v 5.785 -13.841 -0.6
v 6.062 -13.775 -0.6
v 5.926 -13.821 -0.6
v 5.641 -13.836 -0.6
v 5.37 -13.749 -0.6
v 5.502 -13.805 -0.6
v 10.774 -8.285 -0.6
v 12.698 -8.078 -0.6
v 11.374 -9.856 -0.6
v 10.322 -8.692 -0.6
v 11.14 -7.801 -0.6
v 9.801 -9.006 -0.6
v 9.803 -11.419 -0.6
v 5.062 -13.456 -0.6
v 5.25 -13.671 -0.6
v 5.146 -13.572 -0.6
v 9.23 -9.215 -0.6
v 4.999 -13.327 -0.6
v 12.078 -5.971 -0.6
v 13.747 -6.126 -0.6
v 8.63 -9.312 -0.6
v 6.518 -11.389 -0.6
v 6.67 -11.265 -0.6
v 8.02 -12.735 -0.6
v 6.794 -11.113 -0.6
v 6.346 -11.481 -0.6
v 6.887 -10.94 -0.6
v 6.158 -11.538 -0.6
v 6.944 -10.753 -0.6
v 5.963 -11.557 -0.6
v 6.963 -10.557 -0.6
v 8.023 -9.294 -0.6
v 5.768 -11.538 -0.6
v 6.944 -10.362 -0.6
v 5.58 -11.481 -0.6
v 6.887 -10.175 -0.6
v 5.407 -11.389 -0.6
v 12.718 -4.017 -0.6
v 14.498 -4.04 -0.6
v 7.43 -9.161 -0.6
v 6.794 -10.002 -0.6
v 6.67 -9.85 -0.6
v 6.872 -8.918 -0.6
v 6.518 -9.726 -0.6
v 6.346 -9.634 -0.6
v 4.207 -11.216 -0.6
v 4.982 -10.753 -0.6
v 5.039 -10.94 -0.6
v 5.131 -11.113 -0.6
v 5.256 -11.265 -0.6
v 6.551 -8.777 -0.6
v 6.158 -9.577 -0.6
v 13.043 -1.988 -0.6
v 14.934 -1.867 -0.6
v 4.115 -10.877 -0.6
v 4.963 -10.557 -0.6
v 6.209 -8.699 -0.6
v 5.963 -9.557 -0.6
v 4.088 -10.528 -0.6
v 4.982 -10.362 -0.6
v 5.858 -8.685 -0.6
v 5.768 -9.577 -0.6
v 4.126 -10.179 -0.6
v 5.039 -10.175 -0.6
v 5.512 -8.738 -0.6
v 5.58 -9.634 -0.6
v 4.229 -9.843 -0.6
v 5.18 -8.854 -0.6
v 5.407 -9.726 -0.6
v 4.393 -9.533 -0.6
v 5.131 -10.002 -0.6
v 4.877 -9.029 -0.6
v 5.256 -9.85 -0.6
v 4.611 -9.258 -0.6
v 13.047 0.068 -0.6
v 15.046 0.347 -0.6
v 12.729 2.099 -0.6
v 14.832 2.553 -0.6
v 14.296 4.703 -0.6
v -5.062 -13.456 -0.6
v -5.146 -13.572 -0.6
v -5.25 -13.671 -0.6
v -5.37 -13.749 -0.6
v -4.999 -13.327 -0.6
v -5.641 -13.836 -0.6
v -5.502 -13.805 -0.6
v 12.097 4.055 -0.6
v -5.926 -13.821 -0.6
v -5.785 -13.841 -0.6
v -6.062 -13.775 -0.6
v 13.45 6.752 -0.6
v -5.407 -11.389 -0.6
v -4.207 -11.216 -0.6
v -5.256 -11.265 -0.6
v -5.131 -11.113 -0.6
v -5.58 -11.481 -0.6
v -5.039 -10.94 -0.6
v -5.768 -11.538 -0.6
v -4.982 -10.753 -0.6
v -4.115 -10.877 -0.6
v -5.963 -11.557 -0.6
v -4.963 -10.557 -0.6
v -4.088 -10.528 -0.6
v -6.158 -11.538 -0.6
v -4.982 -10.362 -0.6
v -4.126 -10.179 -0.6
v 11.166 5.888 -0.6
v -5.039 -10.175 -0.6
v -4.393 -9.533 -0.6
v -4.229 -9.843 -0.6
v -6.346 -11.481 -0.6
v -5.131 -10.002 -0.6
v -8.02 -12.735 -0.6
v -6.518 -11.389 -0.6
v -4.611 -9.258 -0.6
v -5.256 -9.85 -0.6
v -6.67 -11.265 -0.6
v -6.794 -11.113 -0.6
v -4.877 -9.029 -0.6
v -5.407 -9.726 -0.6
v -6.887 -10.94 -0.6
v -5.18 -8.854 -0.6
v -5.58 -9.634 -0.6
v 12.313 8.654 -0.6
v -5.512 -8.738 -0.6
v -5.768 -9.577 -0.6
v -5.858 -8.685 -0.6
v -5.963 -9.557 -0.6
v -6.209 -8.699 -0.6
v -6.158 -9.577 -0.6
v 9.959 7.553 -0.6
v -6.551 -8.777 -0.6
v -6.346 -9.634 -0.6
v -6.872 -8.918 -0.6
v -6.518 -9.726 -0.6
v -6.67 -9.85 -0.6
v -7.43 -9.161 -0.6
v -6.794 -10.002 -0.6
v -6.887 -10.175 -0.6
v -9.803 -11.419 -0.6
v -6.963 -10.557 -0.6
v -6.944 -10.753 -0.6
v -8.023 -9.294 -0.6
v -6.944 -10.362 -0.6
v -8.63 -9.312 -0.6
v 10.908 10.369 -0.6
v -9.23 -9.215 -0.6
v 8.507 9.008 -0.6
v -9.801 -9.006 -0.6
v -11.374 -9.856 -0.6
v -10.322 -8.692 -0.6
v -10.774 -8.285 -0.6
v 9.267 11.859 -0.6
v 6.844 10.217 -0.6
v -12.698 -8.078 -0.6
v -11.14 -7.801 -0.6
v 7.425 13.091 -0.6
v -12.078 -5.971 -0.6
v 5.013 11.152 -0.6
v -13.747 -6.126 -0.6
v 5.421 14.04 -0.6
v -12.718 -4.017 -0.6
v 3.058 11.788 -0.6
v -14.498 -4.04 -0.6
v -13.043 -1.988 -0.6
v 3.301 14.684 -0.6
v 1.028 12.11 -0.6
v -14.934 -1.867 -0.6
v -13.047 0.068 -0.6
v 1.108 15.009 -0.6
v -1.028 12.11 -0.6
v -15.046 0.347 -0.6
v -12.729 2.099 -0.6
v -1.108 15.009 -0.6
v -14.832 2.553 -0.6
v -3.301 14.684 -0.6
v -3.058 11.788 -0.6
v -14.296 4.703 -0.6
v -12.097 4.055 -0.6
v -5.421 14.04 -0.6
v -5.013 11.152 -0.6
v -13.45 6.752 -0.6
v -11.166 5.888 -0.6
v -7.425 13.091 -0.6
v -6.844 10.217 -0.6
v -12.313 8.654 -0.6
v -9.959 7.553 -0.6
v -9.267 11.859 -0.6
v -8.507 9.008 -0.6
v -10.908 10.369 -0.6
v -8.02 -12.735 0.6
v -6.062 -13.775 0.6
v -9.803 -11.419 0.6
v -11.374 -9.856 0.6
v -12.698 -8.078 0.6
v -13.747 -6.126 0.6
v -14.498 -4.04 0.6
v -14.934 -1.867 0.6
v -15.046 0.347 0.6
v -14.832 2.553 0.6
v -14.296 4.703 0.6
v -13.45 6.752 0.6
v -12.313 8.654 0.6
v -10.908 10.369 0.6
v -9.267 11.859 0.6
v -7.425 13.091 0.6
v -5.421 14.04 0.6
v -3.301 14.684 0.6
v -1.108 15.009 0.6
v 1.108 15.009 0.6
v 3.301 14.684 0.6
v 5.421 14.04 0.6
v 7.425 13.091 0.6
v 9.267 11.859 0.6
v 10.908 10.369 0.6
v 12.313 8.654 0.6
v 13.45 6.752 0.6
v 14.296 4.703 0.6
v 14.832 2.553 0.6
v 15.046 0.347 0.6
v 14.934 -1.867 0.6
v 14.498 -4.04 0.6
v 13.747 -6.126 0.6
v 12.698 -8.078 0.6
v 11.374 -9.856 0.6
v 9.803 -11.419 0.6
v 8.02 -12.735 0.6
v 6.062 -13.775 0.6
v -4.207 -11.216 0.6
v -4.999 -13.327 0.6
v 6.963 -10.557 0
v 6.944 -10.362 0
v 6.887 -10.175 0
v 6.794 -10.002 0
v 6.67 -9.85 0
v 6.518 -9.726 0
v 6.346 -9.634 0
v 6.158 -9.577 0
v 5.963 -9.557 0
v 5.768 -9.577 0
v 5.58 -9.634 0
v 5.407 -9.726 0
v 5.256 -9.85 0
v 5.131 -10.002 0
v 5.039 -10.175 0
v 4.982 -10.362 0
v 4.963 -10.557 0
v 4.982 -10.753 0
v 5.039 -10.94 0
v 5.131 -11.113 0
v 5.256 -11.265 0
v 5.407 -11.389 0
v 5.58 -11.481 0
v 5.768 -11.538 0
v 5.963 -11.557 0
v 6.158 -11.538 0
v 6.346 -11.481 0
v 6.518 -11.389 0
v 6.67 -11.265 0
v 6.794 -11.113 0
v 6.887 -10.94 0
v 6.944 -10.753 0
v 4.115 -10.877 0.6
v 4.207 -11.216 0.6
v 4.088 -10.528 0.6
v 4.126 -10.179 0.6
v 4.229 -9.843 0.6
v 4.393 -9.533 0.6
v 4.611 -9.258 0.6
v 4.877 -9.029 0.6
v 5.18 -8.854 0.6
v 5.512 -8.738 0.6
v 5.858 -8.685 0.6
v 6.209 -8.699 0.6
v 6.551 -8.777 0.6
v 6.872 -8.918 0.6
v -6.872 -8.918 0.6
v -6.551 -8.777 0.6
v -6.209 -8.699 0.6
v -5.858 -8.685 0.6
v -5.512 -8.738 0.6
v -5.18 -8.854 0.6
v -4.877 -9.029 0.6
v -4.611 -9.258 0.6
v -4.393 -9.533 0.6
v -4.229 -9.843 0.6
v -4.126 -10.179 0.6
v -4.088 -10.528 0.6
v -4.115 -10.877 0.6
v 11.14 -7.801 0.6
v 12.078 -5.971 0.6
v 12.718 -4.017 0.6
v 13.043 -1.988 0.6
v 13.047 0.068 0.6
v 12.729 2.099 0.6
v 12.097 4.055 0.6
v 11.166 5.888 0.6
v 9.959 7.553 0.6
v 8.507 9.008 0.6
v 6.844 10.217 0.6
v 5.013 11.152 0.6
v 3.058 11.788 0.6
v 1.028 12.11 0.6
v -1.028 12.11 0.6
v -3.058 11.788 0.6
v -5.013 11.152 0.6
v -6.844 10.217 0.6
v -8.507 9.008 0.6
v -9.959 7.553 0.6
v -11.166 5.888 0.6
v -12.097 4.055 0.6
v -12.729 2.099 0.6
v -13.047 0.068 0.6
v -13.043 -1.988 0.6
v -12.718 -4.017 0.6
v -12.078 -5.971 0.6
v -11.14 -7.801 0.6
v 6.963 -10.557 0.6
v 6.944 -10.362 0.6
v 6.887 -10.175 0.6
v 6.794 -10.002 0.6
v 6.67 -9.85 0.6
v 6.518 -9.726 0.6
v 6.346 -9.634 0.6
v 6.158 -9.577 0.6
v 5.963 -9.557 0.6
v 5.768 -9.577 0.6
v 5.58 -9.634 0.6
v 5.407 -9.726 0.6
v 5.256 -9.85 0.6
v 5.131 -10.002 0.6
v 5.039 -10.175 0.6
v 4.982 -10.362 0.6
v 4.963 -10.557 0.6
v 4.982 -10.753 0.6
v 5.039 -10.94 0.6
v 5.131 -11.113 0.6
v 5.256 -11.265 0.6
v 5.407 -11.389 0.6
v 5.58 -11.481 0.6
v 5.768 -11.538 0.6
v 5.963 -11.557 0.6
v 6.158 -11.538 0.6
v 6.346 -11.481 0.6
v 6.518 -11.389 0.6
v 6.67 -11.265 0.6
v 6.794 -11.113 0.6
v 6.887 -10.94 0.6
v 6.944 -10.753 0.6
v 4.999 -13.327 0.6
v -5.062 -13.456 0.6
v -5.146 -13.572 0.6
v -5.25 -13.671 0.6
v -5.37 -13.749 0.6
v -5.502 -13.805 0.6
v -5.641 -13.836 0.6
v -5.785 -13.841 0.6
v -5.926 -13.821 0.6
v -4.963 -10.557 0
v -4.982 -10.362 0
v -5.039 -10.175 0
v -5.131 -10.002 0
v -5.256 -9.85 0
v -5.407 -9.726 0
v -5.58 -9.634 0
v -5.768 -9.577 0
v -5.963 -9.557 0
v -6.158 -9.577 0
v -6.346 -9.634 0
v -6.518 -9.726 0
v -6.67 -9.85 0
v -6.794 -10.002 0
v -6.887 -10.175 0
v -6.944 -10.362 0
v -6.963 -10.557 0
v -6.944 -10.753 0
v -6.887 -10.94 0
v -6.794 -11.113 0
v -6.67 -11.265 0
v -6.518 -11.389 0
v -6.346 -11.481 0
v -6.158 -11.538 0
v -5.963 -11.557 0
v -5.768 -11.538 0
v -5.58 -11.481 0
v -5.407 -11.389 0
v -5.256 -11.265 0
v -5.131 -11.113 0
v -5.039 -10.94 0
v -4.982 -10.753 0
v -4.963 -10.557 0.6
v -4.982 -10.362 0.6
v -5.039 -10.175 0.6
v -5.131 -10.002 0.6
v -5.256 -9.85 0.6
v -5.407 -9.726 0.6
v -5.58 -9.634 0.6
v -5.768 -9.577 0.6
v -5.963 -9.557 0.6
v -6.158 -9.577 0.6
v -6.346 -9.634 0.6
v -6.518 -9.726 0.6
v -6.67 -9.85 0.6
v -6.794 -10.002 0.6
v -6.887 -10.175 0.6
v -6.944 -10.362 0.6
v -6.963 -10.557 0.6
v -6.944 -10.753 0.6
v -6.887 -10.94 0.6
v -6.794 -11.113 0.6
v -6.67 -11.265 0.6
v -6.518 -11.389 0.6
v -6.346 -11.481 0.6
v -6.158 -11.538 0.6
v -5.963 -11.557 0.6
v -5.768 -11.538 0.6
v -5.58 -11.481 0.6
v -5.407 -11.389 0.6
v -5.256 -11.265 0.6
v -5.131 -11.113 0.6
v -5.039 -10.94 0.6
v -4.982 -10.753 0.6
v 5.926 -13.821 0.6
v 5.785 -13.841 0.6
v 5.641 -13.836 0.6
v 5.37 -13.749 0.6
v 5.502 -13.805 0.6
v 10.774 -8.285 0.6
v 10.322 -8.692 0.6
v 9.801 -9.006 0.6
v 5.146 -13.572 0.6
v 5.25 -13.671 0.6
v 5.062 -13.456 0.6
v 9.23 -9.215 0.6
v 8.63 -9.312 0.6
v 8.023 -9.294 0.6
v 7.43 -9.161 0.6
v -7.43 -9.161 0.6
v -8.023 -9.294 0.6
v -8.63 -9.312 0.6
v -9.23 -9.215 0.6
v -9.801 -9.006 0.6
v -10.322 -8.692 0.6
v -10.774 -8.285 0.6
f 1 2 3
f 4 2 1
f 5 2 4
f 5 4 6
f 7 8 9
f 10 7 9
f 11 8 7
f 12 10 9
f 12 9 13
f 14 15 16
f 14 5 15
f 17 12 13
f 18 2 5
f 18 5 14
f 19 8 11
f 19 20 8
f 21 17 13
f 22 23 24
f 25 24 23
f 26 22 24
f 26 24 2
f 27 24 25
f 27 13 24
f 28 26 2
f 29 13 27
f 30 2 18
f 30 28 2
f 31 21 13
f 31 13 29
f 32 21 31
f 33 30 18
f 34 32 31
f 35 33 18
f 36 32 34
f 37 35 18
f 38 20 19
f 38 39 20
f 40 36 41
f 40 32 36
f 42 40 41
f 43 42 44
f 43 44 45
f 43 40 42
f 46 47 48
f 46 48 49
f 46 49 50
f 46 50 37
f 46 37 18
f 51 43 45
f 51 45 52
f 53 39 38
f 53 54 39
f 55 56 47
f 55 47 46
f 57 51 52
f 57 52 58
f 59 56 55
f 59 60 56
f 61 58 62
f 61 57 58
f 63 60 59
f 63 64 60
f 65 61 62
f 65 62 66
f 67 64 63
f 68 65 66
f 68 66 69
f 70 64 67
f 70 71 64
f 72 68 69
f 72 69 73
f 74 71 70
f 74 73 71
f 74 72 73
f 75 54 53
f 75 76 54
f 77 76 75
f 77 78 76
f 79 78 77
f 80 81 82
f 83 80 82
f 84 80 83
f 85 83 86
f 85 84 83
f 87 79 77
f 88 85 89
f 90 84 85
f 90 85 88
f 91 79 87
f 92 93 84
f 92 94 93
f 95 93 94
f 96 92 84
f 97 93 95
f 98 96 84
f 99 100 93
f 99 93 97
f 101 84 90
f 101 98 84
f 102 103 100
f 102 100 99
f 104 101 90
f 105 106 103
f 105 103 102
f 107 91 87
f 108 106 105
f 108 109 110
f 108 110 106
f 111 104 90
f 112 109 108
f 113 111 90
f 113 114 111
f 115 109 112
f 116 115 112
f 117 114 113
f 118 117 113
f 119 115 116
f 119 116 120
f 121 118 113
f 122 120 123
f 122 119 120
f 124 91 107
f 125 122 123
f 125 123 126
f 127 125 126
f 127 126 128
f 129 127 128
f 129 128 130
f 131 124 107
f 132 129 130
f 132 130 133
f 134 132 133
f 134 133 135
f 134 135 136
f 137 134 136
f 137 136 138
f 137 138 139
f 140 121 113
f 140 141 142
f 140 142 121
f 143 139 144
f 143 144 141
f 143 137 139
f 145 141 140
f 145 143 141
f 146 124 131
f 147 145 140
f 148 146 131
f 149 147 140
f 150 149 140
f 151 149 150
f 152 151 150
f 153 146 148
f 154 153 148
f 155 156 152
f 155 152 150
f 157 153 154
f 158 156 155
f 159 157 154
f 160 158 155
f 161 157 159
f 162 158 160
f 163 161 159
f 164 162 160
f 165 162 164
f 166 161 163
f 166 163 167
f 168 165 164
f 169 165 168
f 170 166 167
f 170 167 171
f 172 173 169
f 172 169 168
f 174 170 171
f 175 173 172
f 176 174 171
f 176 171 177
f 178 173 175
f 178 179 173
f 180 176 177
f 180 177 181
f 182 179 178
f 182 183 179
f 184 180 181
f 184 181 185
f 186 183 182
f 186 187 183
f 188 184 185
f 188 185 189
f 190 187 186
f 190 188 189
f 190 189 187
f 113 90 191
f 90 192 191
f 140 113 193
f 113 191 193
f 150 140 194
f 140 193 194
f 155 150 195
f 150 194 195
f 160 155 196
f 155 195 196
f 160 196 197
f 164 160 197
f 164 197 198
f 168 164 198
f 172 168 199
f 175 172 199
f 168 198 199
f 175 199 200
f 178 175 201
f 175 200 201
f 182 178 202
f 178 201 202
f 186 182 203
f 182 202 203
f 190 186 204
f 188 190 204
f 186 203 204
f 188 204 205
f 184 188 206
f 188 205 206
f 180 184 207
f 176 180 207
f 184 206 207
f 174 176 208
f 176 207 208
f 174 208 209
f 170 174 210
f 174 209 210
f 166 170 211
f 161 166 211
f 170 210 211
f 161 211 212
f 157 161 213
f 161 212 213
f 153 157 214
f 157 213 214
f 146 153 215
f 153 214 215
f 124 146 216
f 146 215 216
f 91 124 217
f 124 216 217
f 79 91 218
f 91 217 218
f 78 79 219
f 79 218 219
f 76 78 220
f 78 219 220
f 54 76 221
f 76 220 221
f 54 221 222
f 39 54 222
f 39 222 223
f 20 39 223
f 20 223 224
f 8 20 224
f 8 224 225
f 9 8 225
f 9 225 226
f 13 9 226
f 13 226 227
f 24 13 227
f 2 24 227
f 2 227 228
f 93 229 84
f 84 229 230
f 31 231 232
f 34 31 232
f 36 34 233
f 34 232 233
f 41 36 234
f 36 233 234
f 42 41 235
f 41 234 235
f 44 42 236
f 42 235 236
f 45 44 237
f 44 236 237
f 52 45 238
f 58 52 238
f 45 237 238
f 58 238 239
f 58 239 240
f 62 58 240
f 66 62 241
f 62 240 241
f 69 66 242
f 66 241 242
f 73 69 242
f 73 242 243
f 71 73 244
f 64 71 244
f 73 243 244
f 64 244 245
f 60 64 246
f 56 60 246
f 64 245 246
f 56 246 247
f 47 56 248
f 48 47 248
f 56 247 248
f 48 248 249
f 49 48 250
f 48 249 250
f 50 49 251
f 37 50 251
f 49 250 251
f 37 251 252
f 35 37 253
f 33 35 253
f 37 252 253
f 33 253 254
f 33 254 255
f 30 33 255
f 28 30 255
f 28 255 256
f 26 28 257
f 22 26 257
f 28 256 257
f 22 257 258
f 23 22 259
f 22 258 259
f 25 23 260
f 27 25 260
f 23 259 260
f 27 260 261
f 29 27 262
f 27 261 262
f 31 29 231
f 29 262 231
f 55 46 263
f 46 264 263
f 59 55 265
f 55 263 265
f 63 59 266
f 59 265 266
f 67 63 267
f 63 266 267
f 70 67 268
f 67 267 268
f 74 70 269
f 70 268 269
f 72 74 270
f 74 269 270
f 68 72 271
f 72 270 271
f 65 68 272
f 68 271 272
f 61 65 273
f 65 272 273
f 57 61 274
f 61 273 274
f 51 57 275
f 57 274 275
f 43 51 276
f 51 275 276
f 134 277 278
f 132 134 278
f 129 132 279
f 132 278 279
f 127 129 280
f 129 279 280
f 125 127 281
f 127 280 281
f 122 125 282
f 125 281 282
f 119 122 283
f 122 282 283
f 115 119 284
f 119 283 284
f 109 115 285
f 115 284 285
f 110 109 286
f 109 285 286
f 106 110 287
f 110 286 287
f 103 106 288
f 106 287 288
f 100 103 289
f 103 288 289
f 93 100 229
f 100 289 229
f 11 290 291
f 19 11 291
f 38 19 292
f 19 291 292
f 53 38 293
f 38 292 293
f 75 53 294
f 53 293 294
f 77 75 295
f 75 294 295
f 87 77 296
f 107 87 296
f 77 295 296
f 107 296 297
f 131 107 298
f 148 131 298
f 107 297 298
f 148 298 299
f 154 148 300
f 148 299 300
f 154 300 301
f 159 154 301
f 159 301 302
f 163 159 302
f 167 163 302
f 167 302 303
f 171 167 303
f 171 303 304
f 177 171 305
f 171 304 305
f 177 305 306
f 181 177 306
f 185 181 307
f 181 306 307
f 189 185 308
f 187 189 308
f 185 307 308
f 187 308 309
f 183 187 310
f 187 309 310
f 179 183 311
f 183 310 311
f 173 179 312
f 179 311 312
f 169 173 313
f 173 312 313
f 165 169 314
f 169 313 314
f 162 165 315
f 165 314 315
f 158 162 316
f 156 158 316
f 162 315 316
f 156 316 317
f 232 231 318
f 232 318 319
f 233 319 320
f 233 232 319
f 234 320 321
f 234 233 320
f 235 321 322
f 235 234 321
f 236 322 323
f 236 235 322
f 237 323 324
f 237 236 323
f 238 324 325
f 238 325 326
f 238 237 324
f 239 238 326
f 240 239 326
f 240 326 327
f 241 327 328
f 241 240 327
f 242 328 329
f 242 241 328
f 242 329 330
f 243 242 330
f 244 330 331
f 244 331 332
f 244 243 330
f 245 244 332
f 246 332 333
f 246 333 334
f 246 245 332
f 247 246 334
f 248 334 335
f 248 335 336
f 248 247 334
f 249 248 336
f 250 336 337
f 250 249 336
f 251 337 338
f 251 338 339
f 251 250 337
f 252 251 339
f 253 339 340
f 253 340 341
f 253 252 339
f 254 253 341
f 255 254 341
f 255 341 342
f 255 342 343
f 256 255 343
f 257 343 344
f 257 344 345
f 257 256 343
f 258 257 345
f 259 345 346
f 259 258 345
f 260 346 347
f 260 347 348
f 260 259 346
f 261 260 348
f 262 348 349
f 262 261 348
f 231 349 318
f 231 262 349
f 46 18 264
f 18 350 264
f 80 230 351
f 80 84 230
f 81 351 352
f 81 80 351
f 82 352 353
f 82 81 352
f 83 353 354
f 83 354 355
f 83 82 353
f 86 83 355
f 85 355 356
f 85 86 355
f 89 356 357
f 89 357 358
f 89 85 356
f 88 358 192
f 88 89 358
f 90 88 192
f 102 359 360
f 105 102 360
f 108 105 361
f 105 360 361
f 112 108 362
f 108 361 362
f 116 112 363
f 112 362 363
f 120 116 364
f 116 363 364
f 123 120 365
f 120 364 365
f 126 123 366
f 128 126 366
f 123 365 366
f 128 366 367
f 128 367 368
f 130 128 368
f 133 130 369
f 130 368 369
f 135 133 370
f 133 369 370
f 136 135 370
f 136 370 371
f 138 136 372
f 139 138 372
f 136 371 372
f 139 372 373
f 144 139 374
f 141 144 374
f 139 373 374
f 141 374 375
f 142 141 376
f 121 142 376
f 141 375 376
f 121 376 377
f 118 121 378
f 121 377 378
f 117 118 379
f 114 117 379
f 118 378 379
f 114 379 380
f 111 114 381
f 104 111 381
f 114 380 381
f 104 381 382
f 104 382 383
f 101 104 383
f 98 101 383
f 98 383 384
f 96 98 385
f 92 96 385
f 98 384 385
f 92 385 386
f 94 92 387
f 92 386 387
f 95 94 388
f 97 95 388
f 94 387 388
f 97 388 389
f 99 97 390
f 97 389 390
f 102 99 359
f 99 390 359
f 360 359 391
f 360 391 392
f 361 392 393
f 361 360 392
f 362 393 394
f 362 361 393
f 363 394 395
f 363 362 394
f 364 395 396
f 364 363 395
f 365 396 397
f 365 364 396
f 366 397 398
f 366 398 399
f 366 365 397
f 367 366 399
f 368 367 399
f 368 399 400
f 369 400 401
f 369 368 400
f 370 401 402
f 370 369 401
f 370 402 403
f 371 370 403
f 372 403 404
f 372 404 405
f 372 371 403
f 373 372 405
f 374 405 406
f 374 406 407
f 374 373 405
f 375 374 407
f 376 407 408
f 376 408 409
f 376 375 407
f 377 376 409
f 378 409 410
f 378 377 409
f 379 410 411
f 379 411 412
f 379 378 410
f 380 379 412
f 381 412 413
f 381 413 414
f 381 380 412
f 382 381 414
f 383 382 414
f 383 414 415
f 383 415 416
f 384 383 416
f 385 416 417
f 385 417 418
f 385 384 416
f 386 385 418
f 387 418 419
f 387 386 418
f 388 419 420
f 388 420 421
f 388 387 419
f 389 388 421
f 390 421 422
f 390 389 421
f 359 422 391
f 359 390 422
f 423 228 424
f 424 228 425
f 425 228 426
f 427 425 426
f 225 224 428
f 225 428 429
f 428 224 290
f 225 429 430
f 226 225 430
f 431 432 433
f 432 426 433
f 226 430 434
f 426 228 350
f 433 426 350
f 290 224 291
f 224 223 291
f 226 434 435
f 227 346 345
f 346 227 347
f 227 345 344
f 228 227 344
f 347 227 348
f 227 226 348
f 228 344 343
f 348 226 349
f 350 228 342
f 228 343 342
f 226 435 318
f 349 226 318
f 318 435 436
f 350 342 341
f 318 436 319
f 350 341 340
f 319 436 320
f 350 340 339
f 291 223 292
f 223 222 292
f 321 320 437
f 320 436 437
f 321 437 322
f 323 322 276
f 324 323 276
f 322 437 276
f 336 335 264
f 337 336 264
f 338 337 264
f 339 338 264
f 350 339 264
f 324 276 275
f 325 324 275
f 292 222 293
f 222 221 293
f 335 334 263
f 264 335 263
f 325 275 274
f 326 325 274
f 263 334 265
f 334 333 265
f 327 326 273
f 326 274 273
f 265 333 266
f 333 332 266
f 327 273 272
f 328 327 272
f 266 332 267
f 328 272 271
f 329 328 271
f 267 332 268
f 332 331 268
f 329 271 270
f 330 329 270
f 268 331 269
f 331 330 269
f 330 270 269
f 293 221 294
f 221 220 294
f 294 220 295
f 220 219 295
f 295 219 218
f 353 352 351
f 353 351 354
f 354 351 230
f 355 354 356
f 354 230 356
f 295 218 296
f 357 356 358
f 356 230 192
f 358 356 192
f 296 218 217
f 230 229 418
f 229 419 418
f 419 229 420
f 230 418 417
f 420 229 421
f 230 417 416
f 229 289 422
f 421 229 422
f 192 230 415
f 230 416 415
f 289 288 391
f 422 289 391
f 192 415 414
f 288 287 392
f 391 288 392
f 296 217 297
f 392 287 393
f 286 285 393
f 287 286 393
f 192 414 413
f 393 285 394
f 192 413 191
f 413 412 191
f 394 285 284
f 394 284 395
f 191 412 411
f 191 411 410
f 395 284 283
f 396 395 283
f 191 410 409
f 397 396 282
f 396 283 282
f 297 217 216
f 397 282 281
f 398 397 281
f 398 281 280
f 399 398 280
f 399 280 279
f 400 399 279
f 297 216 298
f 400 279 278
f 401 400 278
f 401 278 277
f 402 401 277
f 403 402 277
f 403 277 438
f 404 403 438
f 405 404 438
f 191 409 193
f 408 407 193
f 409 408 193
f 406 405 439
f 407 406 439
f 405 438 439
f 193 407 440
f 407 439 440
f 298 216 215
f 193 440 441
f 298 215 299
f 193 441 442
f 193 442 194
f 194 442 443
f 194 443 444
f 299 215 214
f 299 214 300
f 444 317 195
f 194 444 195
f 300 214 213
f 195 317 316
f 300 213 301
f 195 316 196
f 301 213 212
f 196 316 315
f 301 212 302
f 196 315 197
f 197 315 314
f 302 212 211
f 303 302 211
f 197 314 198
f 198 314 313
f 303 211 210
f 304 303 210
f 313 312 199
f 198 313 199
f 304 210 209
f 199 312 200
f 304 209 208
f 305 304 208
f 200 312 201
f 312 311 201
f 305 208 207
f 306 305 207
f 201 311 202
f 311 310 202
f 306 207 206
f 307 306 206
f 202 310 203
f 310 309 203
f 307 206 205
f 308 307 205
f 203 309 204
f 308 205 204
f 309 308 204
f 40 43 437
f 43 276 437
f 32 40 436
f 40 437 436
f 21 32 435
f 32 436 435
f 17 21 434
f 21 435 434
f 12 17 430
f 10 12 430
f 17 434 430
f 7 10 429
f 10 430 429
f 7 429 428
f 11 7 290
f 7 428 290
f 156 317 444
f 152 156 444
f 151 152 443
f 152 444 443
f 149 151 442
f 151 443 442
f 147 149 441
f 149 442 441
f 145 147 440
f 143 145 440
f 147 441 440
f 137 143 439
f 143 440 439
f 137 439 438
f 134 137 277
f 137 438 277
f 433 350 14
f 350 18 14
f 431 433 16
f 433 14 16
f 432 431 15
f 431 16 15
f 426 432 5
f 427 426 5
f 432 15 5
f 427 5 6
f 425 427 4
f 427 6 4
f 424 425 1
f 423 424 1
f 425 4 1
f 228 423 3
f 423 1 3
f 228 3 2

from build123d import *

# Parameters (mm, degrees)
SKETCH3_R                = 1
BOSS_EXTRUDE1_DEPTH      = 0.6
BOSS_EXTRUDE1_DEPTH_BACK = 0.6
FILLET1_R                = 0.79375


with BuildPart() as part:
    # Sketch3 → Boss-Extrude1 (new body, two sides)
    with BuildSketch(Plane.XY) as boss_extrude1_sk:
        with BuildLine():
            Line((-4.20731071, -11.215994677), (-5.285853659, -14.091211839))
            ThreePointArc((-5.285853659, -14.091211839), (0, 15.05), (5.285853659, -14.091211839))
            Line((5.285853659, -14.091211839), (4.20731071, -11.215994677))
            ThreePointArc((4.20731071, -11.215994677), (4.738417429, -9.137470587), (6.87245355, -8.917865085))
            ThreePointArc((6.87245355, -8.917865085), (9.230393871, -9.214719738), (11.140467802, -7.800639534))
            ThreePointArc((11.140467802, -7.800639534), (0, 12.15), (-11.140467802, -7.800639534))
            ThreePointArc((-11.140467802, -7.800639534), (-9.230393871, -9.214719738), (-6.87245355, -8.917865085))
            ThreePointArc((-6.87245355, -8.917865085), (-4.738417429, -9.137470587), (-4.20731071, -11.215994677))
        make_face()
        with Locations((-5.962860358, -10.557458091)):
            Circle(SKETCH3_R, mode=Mode.SUBTRACT)
        with Locations((5.962860358, -10.557458091)):
            Circle(SKETCH3_R, mode=Mode.SUBTRACT)
    extrude(amount=BOSS_EXTRUDE1_DEPTH)
    extrude(boss_extrude1_sk.sketch, amount=-BOSS_EXTRUDE1_DEPTH_BACK)

    # Fillet1
    fillet1_edges = [part.edges().sort_by_distance(p)[0] for p in [
        (5.285853659, -14.091211839, 0),
        (-5.285853659, -14.091211839, 0),
    ]]
    fillet(fillet1_edges, radius=FILLET1_R)


solid = part.part
